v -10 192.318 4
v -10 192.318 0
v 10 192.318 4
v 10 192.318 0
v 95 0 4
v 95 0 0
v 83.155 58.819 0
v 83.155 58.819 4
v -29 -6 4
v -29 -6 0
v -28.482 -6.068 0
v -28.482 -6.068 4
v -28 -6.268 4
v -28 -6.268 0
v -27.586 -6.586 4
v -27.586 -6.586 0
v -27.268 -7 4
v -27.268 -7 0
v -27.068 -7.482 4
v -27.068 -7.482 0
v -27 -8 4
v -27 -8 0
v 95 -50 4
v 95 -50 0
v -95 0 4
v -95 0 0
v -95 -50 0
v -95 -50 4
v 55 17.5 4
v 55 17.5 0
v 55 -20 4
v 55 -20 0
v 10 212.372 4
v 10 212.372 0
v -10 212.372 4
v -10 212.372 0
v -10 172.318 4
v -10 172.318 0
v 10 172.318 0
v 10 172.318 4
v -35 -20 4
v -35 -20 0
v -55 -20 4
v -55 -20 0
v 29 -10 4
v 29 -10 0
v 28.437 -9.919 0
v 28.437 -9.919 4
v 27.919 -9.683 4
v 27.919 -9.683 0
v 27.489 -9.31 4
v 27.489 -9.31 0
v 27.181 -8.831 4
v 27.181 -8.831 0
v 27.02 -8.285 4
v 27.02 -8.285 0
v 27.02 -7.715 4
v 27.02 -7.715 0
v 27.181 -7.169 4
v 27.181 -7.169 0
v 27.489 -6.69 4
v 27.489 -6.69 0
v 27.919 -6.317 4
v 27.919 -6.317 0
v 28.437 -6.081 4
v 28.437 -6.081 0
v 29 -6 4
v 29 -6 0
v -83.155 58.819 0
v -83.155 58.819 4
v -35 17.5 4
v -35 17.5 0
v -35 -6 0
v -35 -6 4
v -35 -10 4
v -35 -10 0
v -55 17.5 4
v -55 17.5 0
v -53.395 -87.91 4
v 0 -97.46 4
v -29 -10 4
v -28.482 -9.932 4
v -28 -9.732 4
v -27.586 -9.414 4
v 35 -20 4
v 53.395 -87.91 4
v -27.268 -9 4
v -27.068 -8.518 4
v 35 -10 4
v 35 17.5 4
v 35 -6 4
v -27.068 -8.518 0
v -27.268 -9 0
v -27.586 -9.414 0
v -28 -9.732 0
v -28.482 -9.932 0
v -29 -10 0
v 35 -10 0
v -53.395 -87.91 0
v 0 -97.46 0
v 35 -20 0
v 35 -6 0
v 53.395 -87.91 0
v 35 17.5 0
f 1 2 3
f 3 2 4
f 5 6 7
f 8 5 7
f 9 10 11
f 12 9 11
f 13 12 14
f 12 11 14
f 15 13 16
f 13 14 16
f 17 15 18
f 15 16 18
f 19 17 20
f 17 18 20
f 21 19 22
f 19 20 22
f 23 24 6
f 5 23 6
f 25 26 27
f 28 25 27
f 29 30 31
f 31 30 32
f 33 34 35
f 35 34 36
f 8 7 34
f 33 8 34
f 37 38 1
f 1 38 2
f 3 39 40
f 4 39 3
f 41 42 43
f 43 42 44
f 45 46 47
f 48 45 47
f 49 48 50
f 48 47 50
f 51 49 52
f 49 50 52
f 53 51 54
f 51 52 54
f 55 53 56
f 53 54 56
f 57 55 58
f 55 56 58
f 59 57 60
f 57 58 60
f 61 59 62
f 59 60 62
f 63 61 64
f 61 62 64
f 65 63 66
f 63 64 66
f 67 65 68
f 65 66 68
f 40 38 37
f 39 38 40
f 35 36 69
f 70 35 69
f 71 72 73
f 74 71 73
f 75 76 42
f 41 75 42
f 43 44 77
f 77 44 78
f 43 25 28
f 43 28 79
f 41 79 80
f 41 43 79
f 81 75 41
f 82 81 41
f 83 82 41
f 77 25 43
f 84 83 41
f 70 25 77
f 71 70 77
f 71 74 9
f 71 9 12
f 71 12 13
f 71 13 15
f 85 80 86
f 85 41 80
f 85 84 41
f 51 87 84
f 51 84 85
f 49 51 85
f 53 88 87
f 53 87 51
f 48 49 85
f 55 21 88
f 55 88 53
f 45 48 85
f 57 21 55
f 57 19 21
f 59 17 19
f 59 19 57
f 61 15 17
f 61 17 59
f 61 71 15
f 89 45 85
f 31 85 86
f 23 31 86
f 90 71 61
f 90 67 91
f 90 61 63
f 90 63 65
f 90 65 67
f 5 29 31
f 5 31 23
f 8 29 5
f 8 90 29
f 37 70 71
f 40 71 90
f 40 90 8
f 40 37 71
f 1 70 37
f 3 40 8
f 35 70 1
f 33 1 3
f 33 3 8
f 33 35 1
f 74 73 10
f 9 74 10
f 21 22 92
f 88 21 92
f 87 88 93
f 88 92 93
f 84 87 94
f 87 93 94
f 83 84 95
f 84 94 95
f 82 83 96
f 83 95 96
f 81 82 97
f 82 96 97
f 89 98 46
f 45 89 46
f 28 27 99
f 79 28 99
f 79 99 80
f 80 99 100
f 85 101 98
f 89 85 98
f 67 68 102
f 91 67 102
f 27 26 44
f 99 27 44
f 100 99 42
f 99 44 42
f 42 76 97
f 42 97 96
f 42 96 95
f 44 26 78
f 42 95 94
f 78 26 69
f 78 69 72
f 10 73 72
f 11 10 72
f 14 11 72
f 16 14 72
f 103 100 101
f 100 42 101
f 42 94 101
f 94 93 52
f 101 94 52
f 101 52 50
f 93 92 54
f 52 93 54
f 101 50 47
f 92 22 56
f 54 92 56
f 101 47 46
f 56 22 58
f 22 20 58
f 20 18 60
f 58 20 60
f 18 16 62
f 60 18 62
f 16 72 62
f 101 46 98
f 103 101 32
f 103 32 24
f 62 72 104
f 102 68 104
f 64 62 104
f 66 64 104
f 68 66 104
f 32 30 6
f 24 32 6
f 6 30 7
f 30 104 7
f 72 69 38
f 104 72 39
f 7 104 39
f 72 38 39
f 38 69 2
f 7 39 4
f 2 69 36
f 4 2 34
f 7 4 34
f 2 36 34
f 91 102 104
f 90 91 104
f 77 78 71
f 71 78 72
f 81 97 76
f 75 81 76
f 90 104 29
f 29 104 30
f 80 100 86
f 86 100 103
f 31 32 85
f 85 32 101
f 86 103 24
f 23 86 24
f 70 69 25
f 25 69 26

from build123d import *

# Parameters (mm, degrees)
F0_W     = 20
F0_H     = 20
F1_DEPTH = 4


with BuildPart() as f1:
    # F0 (on Top) → F1 (new body)
    with BuildSketch(Plane.XY):
        Polygon((-83.155292, 58.819239), (-95, 0), (-95, -50), (-53.394669, -87.909631), (0, -97.459667), (53.394669, -87.909631), (95, -50), (95, 0), (83.155292, 58.819239), (10, 212.371753), (-10, 212.371753), align=None)
        with BuildLine():
            Line((-55, -20), (-55, 17.5))
            Line((-55, 17.5), (-35, 17.5))
            Line((-35, 17.5), (-35, -6))
            Line((-35, -6), (-29, -6))
            ThreePointArc((-29, -6), (-27.585786, -6.585786), (-27, -8))
            ThreePointArc((-27, -8), (-27.585786, -9.414214), (-29, -10))
            Line((-29, -10), (-35, -10))
            Line((-35, -10), (-35, -20))
            Line((-35, -20), (-55, -20))
        make_face(mode=Mode.SUBTRACT)
        with BuildLine():
            Line((35, -6), (35, 17.5))
            Line((35, 17.5), (55, 17.5))
            Line((55, 17.5), (55, -20))
            Line((55, -20), (35, -20))
            Line((35, -20), (35, -10))
            Line((35, -10), (29, -10))
            ThreePointArc((29, -10), (27, -8), (29, -6))
            Line((29, -6), (35, -6))
        make_face(mode=Mode.SUBTRACT)
        with Locations((0, 182.317775)):
            Rectangle(F0_W, F0_H, mode=Mode.SUBTRACT)
    extrude(amount=F1_DEPTH)


solid = f1.part
